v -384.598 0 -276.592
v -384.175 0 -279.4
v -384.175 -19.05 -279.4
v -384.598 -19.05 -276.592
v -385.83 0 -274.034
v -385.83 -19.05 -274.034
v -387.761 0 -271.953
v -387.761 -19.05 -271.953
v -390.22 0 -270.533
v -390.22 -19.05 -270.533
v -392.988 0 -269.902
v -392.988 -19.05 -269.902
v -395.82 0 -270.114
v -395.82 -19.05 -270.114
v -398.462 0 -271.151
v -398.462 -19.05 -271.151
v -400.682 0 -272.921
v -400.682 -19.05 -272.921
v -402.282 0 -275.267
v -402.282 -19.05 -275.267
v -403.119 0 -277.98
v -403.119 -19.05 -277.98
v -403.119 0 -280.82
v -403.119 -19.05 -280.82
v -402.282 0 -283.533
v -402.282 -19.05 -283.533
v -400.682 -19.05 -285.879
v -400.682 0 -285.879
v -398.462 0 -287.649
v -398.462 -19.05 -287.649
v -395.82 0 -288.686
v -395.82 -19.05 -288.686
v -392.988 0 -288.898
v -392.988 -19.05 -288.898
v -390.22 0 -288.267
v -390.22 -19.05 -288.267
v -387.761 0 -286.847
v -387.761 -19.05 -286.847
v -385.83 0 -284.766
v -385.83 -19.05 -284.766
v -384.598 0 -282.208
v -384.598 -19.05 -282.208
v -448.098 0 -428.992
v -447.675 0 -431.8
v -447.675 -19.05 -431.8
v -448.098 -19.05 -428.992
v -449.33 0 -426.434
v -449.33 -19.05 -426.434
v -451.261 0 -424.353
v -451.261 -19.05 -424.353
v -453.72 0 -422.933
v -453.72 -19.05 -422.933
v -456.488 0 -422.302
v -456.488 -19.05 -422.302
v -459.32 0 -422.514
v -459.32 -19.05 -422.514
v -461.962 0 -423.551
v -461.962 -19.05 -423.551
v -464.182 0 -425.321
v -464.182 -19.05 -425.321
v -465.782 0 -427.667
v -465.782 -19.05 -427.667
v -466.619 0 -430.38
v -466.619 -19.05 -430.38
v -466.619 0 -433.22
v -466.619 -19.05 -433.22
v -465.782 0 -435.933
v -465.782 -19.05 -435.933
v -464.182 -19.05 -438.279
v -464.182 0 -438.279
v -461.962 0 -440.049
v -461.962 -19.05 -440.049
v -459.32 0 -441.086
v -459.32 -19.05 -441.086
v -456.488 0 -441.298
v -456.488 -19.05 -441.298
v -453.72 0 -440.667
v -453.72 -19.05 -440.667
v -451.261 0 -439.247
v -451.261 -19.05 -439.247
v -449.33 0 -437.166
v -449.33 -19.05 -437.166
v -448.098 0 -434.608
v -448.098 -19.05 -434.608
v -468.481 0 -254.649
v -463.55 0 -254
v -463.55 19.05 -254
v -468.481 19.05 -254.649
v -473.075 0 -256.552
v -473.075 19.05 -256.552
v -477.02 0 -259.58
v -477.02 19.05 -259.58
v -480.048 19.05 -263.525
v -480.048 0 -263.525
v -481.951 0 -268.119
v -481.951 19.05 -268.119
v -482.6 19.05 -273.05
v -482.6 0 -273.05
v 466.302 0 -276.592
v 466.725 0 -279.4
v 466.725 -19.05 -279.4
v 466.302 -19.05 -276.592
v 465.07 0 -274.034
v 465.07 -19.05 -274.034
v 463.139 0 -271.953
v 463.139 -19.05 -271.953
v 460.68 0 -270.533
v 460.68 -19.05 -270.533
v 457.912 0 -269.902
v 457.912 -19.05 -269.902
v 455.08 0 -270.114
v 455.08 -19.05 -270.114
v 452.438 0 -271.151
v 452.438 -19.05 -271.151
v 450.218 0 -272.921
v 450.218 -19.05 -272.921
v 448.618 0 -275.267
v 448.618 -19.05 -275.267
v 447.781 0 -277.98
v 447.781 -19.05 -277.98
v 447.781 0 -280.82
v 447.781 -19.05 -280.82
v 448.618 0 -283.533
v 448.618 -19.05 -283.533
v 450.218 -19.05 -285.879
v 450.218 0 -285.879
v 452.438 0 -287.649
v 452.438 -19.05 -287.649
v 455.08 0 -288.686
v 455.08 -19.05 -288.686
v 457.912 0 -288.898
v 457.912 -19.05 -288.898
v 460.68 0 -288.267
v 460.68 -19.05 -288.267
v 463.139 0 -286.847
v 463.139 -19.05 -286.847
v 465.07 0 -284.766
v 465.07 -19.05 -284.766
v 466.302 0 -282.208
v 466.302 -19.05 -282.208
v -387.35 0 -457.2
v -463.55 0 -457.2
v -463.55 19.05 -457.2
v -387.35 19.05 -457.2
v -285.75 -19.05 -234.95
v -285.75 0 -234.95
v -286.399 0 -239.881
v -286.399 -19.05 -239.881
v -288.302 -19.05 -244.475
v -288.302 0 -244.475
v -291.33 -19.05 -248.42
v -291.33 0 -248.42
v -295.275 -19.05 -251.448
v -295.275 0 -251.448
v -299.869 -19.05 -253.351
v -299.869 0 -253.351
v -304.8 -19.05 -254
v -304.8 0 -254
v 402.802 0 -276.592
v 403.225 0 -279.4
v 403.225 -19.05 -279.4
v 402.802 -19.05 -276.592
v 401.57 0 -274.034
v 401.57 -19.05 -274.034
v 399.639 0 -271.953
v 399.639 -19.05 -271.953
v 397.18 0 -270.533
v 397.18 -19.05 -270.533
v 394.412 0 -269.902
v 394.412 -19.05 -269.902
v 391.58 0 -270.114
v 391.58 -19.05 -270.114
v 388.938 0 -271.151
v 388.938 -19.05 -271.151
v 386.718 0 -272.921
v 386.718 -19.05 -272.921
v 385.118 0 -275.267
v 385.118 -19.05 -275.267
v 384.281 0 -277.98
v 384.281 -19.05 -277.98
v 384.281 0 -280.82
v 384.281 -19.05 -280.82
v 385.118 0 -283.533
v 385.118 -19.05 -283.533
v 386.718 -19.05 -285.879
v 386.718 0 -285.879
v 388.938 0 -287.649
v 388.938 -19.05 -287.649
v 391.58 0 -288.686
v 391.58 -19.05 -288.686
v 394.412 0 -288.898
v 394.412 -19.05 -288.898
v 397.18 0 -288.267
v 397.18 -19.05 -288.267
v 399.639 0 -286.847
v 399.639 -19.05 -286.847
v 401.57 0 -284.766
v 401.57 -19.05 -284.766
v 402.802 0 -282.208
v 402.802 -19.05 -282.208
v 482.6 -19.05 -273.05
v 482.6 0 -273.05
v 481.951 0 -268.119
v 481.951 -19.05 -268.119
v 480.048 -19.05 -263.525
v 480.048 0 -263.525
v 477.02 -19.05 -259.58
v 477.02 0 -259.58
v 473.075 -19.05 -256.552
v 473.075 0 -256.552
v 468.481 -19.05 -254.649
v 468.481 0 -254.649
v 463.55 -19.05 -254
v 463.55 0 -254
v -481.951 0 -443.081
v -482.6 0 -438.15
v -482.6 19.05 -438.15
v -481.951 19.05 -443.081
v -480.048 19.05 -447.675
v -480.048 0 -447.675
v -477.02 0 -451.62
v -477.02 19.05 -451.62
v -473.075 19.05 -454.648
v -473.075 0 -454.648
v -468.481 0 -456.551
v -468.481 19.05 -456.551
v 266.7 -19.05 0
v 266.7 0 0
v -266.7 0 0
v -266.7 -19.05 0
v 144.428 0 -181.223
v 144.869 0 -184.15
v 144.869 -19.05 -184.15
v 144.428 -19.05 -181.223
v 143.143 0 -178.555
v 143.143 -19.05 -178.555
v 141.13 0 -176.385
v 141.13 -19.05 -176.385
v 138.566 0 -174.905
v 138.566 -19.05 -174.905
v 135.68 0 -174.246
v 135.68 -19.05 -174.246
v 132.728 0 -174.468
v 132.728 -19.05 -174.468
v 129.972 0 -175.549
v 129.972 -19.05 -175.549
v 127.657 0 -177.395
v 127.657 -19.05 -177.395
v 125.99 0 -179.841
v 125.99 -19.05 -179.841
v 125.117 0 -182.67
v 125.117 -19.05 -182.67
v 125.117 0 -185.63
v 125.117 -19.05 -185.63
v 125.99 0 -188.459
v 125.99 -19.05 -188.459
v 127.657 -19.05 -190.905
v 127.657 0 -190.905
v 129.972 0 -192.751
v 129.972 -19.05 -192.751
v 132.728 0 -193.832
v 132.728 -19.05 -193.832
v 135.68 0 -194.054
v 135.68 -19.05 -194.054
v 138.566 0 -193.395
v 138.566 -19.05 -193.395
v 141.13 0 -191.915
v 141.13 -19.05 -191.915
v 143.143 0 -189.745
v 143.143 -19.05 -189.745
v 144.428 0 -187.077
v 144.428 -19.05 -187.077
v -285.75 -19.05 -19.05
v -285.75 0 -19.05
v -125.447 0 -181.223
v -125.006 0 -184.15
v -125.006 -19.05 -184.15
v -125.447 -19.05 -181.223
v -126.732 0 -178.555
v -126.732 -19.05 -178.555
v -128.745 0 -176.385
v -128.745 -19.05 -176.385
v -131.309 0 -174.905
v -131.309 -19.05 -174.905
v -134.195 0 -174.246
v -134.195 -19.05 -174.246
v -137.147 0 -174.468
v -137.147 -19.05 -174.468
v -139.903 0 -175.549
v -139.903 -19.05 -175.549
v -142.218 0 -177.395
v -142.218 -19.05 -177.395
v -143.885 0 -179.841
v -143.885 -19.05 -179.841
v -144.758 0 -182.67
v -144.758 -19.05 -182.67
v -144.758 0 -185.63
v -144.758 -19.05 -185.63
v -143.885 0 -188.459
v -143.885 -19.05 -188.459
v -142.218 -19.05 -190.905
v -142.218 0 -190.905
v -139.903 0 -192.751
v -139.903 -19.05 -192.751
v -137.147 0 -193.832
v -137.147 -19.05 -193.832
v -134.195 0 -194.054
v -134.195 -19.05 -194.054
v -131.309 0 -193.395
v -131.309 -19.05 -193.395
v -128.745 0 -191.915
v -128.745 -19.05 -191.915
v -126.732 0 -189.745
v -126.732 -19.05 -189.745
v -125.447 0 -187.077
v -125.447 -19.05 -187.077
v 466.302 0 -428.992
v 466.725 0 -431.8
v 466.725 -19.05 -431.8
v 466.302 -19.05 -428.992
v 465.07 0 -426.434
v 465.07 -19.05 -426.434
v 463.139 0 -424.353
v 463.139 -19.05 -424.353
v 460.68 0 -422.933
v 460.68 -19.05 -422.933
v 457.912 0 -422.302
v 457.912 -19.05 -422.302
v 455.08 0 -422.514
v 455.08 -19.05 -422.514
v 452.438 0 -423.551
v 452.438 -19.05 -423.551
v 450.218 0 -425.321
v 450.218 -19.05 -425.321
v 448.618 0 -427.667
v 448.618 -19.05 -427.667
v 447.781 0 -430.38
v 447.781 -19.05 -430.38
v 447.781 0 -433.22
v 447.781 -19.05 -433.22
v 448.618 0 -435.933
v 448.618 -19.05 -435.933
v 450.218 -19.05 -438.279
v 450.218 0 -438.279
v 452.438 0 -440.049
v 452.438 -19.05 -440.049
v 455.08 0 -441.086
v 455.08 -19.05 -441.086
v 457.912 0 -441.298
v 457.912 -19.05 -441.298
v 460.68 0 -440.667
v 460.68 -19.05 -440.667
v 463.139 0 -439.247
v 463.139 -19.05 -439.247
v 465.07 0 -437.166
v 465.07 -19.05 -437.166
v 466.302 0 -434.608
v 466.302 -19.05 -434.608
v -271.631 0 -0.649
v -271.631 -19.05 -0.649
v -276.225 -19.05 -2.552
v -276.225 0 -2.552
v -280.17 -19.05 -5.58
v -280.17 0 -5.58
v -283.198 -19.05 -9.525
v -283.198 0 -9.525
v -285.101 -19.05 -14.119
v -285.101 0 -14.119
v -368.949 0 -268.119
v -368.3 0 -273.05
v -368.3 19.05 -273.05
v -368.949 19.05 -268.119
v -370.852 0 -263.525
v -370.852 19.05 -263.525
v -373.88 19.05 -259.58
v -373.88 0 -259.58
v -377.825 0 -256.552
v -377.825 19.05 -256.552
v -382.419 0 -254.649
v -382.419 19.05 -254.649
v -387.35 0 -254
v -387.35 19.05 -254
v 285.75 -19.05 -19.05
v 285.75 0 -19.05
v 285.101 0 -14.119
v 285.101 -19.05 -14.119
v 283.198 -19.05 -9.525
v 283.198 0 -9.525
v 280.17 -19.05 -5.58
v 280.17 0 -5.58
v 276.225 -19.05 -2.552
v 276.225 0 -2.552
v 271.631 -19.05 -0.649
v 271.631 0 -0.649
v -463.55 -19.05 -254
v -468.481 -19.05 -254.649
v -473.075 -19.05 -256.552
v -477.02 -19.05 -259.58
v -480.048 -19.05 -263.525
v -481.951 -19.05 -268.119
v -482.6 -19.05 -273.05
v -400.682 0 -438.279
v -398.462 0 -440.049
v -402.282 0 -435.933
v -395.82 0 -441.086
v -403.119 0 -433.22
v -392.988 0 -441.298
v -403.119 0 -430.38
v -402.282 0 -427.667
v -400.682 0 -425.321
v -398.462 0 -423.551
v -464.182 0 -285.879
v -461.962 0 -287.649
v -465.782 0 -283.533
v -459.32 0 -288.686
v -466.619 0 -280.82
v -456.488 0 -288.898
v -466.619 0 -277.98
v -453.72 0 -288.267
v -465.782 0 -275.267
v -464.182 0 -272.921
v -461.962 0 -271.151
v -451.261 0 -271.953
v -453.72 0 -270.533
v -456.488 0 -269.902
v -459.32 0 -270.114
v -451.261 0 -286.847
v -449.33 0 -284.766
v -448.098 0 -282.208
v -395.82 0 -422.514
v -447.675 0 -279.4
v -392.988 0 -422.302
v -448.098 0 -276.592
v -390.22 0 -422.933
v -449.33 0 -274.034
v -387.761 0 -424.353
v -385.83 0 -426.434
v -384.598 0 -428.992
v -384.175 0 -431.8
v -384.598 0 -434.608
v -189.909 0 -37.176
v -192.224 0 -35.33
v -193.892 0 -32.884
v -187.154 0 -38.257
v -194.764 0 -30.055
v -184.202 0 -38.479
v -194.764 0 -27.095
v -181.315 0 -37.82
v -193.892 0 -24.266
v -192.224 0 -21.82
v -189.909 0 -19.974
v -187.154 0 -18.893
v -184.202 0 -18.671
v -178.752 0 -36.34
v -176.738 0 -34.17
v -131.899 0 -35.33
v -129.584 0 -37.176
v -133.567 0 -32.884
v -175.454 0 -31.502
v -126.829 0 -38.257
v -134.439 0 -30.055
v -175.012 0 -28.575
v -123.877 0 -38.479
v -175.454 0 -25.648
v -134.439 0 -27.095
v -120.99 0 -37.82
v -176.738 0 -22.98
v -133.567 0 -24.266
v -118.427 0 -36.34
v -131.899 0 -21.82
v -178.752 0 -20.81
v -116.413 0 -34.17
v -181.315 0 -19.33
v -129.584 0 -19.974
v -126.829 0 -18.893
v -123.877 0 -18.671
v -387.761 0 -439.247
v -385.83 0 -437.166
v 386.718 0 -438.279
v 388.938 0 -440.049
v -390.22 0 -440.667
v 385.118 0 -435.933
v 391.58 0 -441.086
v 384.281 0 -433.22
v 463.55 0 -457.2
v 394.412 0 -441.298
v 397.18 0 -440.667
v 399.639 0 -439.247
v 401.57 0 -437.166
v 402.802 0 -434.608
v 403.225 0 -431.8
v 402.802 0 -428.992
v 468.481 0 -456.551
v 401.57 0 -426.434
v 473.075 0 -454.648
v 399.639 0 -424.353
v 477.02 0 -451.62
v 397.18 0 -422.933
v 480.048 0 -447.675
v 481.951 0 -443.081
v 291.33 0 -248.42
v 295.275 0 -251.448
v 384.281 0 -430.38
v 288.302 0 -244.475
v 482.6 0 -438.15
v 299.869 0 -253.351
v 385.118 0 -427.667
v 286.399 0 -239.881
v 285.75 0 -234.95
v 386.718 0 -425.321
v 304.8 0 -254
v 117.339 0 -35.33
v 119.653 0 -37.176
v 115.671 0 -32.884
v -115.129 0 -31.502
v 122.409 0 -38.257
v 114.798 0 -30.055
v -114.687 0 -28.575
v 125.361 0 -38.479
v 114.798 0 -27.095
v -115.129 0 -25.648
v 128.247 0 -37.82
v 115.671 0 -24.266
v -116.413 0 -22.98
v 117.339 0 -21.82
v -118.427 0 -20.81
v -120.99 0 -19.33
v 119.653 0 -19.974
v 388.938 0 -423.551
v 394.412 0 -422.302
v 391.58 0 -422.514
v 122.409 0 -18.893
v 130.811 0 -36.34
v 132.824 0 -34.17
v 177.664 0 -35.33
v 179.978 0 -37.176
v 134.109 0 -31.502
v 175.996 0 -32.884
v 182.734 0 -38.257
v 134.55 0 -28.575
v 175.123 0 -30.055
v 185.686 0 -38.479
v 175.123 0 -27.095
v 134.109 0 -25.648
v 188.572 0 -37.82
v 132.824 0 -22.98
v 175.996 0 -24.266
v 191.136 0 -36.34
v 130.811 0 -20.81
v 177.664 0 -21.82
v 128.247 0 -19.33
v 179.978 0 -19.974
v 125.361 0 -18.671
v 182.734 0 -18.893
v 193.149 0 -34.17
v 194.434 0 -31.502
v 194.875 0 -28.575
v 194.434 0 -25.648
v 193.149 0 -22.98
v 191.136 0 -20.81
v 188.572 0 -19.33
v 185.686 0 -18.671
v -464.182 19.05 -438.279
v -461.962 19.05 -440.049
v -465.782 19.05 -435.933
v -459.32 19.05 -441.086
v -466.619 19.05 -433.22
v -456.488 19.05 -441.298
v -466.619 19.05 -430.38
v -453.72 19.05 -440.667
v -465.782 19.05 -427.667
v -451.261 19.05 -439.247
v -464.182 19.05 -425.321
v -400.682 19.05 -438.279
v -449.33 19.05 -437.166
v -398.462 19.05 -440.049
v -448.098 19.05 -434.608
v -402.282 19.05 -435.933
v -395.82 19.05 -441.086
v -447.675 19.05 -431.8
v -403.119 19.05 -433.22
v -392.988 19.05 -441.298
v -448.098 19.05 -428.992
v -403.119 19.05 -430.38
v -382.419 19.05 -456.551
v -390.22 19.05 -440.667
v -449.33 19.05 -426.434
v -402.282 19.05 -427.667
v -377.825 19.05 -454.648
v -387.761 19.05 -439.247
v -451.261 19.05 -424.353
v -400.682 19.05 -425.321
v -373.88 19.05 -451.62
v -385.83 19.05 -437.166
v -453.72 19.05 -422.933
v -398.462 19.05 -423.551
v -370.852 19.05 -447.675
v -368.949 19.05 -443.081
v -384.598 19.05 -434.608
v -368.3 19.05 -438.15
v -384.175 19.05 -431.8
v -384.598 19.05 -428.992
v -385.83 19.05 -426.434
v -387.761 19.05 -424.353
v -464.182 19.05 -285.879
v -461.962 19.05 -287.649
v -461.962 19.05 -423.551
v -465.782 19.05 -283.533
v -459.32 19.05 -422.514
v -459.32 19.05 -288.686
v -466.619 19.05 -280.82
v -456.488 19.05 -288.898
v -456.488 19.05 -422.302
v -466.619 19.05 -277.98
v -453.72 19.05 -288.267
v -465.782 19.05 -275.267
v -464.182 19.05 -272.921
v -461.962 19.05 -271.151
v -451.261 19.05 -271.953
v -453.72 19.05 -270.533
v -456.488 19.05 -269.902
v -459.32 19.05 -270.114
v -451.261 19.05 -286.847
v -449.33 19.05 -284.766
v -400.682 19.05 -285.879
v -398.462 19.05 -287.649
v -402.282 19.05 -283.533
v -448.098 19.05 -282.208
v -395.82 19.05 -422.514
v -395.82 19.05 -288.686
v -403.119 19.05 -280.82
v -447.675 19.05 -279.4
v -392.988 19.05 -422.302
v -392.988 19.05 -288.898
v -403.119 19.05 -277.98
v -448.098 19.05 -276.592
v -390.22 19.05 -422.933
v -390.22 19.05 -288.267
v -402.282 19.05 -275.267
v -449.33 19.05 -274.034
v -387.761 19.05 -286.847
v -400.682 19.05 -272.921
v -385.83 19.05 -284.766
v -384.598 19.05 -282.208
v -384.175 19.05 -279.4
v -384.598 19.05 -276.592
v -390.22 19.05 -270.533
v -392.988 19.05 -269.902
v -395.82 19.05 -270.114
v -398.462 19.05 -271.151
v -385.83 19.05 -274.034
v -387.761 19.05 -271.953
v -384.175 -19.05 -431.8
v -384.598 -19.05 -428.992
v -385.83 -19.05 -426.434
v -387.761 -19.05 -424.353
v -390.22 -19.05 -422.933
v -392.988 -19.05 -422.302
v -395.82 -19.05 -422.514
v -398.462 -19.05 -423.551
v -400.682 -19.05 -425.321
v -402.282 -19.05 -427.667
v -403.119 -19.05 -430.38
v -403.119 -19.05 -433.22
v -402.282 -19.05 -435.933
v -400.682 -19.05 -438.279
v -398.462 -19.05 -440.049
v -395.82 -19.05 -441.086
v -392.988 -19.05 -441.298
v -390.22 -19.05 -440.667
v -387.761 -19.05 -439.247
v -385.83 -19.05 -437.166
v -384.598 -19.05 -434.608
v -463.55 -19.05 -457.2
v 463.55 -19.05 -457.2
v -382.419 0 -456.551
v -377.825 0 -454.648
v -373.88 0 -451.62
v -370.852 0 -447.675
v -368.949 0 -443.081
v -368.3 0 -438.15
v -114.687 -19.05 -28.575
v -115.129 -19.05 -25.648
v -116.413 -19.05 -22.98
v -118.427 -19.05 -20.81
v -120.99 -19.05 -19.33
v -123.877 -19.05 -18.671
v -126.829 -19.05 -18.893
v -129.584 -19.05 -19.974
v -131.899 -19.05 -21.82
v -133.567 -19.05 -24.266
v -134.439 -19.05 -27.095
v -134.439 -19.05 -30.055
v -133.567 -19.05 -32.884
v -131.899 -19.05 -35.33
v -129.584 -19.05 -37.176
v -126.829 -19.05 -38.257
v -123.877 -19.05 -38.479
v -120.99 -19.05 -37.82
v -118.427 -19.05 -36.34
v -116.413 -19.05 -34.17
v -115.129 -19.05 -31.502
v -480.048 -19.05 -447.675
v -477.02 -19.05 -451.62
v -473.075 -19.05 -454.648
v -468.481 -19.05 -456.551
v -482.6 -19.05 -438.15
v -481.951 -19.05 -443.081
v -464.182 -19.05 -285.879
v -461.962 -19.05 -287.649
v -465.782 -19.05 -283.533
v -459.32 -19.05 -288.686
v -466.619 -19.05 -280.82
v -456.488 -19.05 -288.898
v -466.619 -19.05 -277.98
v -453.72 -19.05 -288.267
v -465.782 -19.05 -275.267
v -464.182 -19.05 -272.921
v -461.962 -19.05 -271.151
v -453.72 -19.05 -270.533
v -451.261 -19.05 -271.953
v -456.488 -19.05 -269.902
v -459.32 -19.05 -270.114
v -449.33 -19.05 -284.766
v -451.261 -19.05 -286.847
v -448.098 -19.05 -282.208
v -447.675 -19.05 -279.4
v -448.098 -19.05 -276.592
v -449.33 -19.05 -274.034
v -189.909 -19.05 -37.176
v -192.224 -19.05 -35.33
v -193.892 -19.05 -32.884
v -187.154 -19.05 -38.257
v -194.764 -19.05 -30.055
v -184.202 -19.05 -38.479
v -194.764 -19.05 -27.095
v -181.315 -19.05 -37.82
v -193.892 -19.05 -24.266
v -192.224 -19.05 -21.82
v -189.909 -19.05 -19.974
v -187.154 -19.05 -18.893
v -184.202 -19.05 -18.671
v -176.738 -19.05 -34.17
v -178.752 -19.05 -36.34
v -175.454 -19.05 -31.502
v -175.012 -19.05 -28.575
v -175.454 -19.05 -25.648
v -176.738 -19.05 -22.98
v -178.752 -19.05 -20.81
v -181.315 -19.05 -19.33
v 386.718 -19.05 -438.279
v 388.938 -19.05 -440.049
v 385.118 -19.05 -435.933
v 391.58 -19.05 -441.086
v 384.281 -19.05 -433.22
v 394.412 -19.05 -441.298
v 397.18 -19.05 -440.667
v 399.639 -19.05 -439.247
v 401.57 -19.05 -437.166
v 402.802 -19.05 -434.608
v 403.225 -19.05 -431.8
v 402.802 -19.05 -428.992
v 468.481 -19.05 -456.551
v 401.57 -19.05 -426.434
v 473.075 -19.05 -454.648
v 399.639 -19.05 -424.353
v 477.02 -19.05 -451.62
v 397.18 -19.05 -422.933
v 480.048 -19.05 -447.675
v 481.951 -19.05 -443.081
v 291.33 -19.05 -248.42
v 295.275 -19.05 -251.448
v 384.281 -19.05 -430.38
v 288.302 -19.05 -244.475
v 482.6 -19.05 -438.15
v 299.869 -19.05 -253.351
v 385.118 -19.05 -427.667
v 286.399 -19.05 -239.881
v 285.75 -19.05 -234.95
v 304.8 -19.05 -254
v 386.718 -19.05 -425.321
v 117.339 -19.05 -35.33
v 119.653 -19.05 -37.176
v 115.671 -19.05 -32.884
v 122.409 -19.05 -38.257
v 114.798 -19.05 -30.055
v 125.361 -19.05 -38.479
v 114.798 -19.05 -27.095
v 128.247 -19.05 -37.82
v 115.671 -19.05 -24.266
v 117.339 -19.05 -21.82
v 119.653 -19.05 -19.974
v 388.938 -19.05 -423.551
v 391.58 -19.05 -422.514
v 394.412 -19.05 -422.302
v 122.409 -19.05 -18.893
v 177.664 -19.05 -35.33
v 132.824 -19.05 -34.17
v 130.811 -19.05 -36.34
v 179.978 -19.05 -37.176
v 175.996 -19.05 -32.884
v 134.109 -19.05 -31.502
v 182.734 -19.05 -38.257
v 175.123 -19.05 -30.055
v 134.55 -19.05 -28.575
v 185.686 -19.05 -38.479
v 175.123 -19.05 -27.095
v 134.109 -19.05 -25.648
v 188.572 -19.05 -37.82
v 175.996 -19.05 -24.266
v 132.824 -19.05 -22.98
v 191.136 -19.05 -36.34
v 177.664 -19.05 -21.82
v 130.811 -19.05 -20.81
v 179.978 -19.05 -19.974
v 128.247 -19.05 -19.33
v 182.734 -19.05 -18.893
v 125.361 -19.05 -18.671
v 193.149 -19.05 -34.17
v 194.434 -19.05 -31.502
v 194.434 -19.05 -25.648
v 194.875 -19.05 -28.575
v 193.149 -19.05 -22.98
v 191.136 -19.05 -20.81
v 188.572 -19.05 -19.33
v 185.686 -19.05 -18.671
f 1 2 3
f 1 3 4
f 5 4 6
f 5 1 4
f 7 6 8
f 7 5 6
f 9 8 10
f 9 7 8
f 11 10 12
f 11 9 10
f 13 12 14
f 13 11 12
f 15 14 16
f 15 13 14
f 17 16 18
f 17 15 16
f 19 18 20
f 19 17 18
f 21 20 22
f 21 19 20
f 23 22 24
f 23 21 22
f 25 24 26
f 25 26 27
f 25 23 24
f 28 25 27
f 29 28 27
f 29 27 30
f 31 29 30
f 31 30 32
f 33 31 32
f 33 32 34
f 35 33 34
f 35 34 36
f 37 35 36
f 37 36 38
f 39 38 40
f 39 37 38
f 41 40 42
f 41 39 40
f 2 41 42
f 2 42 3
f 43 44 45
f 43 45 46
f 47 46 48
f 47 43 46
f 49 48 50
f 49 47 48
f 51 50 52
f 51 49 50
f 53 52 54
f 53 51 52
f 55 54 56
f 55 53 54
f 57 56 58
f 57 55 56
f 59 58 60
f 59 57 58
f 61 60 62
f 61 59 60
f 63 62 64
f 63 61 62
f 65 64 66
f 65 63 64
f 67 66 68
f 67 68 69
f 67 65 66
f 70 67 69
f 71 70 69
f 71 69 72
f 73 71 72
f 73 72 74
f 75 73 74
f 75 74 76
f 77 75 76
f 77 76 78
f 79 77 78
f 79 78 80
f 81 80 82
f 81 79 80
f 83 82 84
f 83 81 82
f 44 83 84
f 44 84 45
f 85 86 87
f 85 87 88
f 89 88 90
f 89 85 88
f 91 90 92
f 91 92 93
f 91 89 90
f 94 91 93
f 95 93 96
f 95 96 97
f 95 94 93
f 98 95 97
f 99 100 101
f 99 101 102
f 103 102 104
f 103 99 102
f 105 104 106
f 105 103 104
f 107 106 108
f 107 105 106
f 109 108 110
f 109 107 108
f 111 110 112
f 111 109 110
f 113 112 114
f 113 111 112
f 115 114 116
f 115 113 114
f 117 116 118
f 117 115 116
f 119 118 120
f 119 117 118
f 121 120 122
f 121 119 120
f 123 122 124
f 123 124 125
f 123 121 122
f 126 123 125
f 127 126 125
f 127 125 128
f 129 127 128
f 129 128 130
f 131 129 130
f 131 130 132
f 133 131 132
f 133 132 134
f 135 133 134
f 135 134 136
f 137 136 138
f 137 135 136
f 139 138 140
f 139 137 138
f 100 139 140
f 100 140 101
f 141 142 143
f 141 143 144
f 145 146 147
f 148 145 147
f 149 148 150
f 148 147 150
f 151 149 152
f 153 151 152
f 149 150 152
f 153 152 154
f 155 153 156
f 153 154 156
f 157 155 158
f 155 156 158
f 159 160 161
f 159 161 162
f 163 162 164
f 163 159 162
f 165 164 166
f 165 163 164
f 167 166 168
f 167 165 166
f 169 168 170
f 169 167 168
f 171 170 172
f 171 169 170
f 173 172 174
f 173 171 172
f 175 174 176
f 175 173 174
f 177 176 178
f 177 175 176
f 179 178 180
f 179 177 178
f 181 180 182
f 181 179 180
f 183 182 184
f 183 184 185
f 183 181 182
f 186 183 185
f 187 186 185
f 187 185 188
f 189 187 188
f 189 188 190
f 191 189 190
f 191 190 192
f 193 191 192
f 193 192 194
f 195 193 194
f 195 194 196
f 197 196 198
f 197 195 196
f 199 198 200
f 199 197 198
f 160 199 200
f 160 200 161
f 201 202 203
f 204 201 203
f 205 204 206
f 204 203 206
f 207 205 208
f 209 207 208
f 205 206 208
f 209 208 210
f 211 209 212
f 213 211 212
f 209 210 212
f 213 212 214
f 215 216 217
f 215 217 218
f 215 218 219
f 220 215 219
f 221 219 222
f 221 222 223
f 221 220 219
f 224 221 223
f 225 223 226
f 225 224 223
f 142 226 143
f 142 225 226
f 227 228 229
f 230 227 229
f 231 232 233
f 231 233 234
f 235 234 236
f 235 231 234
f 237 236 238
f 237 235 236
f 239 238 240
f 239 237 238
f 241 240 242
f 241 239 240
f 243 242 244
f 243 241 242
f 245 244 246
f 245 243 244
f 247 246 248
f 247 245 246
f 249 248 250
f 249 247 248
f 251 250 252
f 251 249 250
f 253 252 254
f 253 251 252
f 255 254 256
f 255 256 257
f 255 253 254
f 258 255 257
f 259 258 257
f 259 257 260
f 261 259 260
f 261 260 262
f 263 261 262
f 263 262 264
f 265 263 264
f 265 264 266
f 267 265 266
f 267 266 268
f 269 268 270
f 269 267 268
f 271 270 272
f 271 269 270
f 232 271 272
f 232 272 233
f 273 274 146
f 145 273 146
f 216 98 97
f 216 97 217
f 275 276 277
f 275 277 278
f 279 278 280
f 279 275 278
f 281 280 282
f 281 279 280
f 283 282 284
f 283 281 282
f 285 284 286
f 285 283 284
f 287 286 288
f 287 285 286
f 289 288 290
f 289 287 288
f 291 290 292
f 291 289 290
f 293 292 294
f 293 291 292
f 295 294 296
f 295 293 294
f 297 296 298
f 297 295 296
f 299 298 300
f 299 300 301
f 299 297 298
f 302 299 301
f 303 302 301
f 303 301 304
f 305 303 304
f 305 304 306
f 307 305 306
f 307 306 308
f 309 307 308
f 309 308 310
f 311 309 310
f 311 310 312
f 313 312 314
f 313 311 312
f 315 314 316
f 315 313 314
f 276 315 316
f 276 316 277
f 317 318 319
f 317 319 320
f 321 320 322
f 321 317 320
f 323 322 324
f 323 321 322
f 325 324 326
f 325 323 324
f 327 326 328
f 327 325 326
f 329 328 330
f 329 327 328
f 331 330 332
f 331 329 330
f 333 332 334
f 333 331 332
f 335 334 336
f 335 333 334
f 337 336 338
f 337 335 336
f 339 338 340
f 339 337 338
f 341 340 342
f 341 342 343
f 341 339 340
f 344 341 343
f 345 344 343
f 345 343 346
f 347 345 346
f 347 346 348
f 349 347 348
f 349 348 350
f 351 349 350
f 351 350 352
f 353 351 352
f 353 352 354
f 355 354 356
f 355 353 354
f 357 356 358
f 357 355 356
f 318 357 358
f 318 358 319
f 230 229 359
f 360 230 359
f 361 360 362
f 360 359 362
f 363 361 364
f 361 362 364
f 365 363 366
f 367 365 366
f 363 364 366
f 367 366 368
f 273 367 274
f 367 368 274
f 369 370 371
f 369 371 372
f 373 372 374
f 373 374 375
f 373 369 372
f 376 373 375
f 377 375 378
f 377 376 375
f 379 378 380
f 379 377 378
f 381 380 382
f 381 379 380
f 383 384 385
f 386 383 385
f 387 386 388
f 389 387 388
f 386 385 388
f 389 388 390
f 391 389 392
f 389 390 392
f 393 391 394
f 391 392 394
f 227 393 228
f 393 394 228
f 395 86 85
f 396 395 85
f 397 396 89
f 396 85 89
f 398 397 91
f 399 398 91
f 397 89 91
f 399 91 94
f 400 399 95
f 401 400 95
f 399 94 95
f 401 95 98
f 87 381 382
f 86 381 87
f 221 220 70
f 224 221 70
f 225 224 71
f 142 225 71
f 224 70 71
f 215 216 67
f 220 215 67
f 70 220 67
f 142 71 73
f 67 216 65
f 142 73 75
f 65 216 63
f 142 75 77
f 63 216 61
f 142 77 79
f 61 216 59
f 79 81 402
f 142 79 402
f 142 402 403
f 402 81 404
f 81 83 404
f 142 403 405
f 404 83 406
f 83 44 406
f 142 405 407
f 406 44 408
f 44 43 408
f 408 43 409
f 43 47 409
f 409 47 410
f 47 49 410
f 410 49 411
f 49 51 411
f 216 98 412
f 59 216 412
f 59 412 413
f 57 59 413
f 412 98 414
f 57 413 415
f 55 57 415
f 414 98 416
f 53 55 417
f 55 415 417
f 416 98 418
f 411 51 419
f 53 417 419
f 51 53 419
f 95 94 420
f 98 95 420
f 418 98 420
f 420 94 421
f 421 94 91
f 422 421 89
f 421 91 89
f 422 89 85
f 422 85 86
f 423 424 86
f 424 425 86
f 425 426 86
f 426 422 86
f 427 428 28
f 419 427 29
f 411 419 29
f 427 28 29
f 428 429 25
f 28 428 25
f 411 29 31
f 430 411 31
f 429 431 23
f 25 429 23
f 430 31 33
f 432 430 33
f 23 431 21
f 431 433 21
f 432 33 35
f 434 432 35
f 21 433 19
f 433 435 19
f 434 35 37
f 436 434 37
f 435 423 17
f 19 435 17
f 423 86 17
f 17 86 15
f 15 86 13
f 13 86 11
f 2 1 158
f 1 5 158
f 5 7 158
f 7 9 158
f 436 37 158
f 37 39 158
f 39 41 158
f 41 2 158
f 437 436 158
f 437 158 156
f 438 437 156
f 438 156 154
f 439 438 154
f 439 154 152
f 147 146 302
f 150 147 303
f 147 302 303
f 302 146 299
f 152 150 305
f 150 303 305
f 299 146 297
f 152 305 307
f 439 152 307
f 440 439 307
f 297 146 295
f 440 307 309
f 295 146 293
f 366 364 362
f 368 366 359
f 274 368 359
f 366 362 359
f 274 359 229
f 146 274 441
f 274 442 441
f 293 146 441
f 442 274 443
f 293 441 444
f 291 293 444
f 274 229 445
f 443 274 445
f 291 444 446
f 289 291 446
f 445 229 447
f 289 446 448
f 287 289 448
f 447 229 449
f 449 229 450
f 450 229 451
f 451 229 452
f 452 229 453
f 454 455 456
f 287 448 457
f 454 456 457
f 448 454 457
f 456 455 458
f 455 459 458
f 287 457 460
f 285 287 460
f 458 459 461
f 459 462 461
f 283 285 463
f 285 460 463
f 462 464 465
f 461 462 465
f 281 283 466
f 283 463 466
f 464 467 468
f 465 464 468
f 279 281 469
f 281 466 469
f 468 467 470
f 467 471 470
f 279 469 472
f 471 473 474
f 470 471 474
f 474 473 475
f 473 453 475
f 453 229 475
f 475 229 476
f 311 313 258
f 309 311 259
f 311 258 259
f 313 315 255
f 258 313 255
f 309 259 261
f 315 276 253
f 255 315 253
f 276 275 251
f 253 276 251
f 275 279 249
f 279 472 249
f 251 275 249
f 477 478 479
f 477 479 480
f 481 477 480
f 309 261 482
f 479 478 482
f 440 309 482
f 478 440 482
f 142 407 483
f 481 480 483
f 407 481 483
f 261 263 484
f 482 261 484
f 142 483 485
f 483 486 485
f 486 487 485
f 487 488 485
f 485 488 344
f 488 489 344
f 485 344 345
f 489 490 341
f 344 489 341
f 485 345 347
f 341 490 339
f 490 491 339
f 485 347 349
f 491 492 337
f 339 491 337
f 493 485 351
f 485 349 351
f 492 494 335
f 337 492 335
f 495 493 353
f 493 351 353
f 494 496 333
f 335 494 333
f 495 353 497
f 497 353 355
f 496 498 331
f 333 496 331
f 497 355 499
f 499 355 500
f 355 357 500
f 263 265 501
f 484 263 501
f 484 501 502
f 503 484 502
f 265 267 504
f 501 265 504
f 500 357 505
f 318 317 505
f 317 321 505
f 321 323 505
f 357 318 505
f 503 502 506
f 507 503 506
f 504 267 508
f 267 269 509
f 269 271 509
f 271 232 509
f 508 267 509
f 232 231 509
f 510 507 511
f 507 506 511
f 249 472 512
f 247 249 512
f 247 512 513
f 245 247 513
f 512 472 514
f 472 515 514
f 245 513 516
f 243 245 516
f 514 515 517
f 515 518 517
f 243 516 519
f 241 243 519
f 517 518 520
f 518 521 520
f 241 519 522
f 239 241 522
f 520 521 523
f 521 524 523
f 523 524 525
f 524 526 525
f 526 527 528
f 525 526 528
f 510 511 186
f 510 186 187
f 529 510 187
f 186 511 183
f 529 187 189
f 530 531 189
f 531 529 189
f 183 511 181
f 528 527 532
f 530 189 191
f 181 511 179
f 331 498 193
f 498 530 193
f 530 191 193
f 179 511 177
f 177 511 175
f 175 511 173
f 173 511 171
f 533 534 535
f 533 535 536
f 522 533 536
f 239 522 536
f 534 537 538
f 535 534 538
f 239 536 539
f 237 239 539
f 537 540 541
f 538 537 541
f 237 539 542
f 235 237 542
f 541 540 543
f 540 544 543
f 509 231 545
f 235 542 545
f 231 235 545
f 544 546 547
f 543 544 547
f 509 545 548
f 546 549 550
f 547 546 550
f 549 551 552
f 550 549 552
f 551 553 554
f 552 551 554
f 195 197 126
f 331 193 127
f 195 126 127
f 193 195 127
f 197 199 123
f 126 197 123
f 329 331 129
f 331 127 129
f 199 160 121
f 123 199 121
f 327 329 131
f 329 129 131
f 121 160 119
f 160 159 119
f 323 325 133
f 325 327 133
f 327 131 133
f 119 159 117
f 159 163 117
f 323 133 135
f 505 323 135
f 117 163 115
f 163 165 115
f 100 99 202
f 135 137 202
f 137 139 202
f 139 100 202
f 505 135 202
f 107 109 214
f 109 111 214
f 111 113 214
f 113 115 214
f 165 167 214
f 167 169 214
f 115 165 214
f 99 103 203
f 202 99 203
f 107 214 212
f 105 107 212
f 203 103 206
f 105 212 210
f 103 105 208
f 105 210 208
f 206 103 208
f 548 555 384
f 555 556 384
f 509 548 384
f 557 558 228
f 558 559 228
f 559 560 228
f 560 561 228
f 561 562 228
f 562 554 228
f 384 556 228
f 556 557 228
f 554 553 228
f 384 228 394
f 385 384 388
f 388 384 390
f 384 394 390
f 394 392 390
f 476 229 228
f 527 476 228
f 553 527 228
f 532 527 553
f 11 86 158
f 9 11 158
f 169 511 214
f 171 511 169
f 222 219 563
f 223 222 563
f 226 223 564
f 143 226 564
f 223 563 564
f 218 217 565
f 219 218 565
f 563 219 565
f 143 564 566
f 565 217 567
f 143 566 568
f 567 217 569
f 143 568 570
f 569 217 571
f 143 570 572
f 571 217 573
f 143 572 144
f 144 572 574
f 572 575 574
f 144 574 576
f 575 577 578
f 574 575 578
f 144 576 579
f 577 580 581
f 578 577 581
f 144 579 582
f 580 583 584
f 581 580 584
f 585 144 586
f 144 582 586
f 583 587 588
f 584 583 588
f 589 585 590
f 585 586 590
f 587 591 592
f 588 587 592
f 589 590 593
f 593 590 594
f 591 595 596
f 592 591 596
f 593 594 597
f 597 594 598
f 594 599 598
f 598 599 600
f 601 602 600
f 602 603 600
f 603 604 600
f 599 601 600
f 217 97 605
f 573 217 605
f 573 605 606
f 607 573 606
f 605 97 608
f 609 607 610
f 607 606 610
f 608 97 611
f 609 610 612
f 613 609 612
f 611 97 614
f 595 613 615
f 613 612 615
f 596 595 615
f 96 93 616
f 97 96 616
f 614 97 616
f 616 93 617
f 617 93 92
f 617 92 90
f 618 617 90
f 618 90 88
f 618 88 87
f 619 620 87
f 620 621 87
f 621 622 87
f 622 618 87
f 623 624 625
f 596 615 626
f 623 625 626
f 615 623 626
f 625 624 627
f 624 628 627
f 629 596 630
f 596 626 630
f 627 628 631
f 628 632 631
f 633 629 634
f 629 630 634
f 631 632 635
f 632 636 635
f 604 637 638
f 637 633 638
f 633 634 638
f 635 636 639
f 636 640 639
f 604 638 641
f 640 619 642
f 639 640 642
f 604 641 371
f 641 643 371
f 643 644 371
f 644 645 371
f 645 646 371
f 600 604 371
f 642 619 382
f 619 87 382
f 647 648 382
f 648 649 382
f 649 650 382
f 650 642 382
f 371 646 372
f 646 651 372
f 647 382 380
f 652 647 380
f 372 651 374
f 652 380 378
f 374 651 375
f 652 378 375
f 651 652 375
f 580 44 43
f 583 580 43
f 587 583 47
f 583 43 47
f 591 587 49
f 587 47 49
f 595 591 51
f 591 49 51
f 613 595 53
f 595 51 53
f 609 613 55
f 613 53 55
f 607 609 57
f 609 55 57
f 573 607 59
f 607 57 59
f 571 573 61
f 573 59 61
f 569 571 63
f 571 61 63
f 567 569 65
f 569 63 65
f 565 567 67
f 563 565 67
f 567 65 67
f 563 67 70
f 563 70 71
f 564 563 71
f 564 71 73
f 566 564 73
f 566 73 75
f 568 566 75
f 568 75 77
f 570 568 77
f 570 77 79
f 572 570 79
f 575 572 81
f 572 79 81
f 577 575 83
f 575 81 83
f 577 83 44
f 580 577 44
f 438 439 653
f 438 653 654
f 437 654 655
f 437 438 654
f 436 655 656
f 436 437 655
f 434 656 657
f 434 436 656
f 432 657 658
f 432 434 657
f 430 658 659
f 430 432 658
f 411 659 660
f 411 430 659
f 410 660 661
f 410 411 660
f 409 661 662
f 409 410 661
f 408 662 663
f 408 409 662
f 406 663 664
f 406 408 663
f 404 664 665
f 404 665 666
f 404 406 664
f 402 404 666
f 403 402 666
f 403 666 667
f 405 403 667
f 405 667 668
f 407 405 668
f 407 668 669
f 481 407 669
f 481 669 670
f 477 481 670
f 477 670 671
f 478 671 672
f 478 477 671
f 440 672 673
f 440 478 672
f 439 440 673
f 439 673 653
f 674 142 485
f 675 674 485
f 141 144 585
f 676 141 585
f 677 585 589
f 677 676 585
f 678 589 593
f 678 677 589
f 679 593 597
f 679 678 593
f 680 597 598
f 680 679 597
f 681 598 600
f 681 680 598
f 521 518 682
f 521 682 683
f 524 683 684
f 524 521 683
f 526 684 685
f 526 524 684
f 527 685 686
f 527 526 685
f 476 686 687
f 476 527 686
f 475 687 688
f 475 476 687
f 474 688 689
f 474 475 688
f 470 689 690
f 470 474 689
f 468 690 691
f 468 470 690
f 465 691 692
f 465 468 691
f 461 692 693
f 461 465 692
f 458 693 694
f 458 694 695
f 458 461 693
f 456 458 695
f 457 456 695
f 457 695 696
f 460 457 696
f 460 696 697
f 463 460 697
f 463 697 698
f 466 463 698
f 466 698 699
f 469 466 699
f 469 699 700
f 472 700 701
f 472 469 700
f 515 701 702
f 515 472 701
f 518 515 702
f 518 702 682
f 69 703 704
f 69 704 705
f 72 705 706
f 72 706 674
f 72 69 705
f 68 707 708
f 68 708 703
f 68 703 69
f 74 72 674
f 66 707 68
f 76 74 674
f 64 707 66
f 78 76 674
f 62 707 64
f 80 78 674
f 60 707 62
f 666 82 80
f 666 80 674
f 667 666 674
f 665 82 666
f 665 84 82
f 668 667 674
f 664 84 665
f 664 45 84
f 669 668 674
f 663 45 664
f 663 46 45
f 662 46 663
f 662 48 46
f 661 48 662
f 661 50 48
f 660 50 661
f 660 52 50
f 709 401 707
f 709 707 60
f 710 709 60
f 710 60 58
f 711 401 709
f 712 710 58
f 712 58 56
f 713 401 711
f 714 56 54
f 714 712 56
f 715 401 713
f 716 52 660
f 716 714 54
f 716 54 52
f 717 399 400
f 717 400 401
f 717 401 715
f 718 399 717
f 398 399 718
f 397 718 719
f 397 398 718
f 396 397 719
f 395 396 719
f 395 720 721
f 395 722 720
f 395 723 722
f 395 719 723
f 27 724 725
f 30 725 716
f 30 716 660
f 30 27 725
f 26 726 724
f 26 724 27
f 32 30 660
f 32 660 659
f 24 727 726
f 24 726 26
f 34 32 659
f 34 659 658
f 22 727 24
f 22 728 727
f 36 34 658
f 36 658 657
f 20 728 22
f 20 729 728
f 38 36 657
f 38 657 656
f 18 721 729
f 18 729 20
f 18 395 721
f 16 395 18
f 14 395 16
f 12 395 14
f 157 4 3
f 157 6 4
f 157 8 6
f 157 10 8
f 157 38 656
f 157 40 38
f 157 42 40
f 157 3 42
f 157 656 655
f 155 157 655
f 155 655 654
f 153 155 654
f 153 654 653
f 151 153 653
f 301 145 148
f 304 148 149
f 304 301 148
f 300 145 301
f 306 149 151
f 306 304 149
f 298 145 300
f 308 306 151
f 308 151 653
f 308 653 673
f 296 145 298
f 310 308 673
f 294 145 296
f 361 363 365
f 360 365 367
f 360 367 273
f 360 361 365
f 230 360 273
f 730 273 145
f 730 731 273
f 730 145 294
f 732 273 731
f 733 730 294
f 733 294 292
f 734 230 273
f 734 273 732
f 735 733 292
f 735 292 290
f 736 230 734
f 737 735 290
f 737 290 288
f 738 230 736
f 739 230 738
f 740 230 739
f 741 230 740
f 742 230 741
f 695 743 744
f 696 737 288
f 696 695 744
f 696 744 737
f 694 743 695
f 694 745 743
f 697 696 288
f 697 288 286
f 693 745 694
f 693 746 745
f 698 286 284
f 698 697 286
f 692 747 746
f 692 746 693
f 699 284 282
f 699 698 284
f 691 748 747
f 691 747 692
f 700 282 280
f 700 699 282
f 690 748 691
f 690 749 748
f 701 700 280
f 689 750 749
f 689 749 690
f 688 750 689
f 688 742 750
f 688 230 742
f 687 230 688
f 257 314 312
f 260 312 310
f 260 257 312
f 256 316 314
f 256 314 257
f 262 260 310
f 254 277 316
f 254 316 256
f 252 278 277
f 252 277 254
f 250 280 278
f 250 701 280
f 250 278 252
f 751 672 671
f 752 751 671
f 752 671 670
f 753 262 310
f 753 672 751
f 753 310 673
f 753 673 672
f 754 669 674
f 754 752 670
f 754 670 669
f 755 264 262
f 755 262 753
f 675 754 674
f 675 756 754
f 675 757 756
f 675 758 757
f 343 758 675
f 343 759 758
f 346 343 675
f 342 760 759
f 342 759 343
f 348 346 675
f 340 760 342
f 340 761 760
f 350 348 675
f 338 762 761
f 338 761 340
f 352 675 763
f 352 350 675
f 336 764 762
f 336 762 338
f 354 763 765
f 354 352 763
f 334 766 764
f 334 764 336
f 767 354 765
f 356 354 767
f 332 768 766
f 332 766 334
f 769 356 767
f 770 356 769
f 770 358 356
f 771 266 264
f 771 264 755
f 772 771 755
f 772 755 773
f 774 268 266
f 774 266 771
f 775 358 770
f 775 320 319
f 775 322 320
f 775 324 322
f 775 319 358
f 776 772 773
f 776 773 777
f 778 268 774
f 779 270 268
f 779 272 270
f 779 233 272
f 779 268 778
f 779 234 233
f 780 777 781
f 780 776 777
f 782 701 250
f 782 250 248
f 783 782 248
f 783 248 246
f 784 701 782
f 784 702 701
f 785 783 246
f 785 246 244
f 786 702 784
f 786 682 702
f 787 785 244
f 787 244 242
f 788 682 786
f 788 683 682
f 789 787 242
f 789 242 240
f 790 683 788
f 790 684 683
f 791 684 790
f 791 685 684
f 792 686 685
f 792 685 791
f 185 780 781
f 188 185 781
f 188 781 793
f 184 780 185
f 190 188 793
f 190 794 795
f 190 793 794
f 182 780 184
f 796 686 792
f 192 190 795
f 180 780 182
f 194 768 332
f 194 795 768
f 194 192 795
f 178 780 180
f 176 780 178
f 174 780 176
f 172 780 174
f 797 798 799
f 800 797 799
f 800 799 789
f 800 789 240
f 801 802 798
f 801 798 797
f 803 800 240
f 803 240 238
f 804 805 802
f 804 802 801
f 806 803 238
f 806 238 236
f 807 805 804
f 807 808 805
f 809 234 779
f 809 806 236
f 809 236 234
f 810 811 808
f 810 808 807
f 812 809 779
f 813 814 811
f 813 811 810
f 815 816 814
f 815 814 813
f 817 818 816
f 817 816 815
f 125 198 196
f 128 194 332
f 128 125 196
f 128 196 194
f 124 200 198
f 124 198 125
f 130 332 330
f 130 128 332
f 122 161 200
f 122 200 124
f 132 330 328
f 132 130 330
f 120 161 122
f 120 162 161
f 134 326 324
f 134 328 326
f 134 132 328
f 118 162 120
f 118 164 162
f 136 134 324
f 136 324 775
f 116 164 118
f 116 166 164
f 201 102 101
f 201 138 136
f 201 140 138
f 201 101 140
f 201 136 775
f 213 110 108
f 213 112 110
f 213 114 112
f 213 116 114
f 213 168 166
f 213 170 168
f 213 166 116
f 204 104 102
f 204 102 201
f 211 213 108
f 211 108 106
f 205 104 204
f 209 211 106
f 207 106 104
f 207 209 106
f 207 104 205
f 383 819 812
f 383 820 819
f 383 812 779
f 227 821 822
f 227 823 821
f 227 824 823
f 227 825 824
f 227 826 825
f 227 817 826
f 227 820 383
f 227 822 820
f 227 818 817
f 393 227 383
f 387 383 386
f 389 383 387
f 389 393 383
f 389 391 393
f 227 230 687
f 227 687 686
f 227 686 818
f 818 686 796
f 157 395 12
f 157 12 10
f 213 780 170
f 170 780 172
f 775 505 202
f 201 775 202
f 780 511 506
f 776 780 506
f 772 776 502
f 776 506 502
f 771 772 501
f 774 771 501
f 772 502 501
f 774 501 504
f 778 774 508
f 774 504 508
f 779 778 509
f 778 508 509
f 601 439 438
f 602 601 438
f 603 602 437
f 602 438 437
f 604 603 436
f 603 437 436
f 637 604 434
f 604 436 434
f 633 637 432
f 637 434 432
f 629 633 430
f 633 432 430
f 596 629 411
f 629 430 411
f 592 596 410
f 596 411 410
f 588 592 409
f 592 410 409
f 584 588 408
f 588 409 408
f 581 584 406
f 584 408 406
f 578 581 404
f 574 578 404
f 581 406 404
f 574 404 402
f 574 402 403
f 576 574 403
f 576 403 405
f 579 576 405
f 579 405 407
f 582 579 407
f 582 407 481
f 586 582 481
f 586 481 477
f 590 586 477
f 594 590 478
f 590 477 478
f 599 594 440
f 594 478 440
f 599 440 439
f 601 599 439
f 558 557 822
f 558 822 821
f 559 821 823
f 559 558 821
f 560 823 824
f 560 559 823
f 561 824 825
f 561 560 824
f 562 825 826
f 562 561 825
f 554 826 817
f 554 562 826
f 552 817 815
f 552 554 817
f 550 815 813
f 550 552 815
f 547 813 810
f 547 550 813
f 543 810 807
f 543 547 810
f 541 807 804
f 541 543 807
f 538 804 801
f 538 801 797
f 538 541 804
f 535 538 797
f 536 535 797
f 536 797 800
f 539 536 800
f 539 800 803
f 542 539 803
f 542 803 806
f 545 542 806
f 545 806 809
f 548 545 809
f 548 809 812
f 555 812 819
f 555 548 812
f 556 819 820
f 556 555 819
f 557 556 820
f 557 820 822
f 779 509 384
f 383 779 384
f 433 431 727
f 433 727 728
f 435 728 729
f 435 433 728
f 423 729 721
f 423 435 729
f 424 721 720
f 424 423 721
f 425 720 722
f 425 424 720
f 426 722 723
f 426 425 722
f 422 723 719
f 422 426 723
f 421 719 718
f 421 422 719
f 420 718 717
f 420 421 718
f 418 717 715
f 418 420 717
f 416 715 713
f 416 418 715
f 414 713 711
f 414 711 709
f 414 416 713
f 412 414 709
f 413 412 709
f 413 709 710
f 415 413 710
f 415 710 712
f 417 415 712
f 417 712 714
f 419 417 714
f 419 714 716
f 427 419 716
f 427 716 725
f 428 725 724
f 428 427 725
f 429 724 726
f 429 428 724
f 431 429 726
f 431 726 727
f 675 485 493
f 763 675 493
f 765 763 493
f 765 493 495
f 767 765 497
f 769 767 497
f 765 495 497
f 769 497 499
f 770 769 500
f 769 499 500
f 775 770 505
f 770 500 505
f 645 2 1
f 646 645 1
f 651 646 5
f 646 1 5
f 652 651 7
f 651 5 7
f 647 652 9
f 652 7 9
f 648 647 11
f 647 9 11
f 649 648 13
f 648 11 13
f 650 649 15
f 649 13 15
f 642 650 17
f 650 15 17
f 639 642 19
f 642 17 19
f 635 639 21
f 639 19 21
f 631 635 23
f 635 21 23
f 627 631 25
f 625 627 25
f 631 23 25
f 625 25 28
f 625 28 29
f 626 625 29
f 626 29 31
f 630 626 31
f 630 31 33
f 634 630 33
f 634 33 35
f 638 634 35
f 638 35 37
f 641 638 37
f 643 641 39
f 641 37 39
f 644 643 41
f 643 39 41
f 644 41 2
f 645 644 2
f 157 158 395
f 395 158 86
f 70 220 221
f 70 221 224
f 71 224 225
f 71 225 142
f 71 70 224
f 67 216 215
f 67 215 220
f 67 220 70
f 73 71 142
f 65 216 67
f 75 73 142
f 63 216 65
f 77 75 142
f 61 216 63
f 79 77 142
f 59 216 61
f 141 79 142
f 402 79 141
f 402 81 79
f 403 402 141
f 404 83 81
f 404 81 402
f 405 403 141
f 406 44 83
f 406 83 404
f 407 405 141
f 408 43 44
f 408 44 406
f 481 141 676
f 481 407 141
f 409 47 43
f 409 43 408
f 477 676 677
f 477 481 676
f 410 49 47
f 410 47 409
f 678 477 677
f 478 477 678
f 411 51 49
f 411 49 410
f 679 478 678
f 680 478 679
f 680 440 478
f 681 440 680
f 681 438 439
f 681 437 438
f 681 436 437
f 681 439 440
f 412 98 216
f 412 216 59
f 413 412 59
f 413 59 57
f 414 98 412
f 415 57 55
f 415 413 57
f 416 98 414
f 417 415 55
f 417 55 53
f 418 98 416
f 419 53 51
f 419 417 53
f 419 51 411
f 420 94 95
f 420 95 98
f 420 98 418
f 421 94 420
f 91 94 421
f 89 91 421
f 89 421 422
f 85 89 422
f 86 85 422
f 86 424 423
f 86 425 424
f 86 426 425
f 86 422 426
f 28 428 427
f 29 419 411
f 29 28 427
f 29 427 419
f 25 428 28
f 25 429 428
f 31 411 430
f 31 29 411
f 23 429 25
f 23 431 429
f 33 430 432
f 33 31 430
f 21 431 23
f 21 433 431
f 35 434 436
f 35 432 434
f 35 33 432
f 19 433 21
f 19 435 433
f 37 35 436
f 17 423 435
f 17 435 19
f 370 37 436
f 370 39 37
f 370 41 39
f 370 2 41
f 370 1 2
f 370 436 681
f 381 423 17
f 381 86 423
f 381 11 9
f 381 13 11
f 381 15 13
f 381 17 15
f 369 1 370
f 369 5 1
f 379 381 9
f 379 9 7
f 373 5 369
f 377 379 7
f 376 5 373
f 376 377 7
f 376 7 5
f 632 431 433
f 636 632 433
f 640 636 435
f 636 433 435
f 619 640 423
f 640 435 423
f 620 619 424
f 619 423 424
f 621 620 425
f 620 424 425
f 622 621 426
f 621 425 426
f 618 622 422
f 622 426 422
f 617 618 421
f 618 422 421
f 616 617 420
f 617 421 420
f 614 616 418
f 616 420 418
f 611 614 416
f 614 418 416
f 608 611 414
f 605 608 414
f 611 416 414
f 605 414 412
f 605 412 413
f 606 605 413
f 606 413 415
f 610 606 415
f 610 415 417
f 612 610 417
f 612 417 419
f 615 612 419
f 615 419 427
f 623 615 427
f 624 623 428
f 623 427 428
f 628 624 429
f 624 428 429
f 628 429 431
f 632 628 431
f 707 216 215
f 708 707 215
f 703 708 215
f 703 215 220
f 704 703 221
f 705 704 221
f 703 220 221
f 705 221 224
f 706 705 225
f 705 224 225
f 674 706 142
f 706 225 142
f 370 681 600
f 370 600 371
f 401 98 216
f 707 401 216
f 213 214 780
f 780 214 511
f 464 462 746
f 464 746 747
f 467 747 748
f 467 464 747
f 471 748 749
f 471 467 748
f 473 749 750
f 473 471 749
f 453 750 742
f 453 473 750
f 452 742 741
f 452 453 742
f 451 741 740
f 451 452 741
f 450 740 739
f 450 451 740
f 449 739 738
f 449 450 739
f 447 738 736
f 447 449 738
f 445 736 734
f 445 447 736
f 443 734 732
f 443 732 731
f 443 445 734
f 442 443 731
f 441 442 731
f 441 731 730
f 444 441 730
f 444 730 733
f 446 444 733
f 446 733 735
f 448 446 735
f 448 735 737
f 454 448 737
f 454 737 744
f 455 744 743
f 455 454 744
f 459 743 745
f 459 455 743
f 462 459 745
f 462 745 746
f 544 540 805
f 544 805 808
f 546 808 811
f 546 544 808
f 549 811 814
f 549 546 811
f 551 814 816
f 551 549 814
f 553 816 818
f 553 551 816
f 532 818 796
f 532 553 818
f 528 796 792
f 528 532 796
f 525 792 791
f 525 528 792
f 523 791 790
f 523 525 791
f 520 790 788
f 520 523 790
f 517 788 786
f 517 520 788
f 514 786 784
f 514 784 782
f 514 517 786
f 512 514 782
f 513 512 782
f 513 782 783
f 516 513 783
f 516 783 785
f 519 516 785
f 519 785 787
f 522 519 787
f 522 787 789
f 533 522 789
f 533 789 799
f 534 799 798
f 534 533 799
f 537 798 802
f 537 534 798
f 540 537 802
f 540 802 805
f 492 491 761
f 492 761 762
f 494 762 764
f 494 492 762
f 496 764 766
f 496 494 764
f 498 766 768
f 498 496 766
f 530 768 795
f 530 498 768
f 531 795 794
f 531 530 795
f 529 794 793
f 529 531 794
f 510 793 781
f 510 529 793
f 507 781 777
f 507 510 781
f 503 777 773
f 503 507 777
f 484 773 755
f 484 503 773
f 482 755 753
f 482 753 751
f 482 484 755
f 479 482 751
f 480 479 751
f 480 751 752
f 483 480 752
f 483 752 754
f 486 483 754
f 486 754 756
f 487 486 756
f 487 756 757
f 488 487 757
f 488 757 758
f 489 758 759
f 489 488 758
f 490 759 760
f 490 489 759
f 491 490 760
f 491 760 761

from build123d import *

# Parameters (mm, degrees)
F0_R     = 9.9314
F0_R_2   = 9.525
F1_DEPTH = 19.05
F2_R     = 9.525
F3_DEPTH = 19.05


with BuildPart() as f1:
    # F0 (on Front) → F1 (new body)
    with BuildSketch(Plane.XZ):
        with BuildLine():
            Line((266.7, 0), (0, 0))
            Line((0, 0), (0, -254))
            Line((0, -254), (304.8, -254))
            ThreePointArc((304.8, -254), (291.329616, -248.420384), (285.75, -234.95))
            Line((285.75, -234.95), (285.75, -19.05))
            ThreePointArc((285.75, -19.05), (280.170384, -5.579616), (266.7, 0))
        make_face()
        with Locations((134.9375, -184.15)):
            Circle(F0_R, mode=Mode.SUBTRACT)
        with Locations((124.61875, -28.575)):
            Circle(F0_R, mode=Mode.SUBTRACT)
        with Locations((184.94375, -28.575)):
            Circle(F0_R, mode=Mode.SUBTRACT)
        with BuildLine():
            ThreePointArc((-266.7, 0), (-280.170384, -5.579616), (-285.75, -19.05))
            Line((-285.75, -19.05), (-285.75, -234.95))
            ThreePointArc((-285.75, -234.95), (-291.329616, -248.420384), (-304.8, -254))
            Line((-304.8, -254), (0, -254))
            Line((0, -254), (0, 0))
            Line((0, 0), (-266.7, 0))
        make_face()
        with Locations((-134.9375, -184.15)):
            Circle(F0_R, mode=Mode.SUBTRACT)
        with Locations((-184.94375, -28.575)):
            Circle(F0_R, mode=Mode.SUBTRACT)
        with Locations((-124.61875, -28.575)):
            Circle(F0_R, mode=Mode.SUBTRACT)
        with BuildLine():
            Line((0, -254), (-304.8, -254))
            Line((-304.8, -254), (-463.55, -254))
            ThreePointArc((-463.55, -254), (-477.020384, -259.579616), (-482.6, -273.05))
            Line((-482.6, -273.05), (-482.6, -438.15))
            ThreePointArc((-482.6, -438.15), (-477.020384, -451.620384), (-463.55, -457.2))
            Line((-463.55, -457.2), (0, -457.2))
            Line((0, -457.2), (0, -254))
        make_face()
        with Locations((-457.2, -431.8)):
            Circle(F0_R_2, mode=Mode.SUBTRACT)
        with Locations((-393.7, -431.8)):
            Circle(F0_R_2, mode=Mode.SUBTRACT)
        with Locations((-457.2, -279.4)):
            Circle(F0_R_2, mode=Mode.SUBTRACT)
        with Locations((-393.7, -279.4)):
            Circle(F0_R_2, mode=Mode.SUBTRACT)
        with BuildLine():
            Line((304.8, -254), (0, -254))
            Line((0, -254), (0, -457.2))
            Line((0, -457.2), (463.55, -457.2))
            ThreePointArc((463.55, -457.2), (477.020384, -451.620384), (482.6, -438.15))
            Line((482.6, -438.15), (482.6, -273.05))
            ThreePointArc((482.6, -273.05), (477.020384, -259.579616), (463.55, -254))
            Line((463.55, -254), (304.8, -254))
        make_face()
        with Locations((393.7, -431.8)):
            Circle(F0_R_2, mode=Mode.SUBTRACT)
        with Locations((457.2, -431.8)):
            Circle(F0_R_2, mode=Mode.SUBTRACT)
        with Locations((393.7, -279.4)):
            Circle(F0_R_2, mode=Mode.SUBTRACT)
        with Locations((457.2, -279.4)):
            Circle(F0_R_2, mode=Mode.SUBTRACT)
    extrude(amount=F1_DEPTH)


with BuildPart() as f3:
    # F2 (on Front) → F3 (new body)
    with BuildSketch(Plane.XZ):
        with BuildLine():
            Line((-387.35, -254), (-425.45, -254))
            Line((-425.45, -254), (-463.55, -254))
            ThreePointArc((-463.55, -254), (-477.020384, -259.579616), (-482.6, -273.05))
            Line((-482.6, -273.05), (-482.6, -438.15))
            ThreePointArc((-482.6, -438.15), (-477.020384, -451.620384), (-463.55, -457.2))
            Line((-463.55, -457.2), (-425.45, -457.2))
            Line((-425.45, -457.2), (-387.35, -457.2))
            ThreePointArc((-387.35, -457.2), (-373.879616, -451.620384), (-368.3, -438.15))
            Line((-368.3, -438.15), (-368.3, -273.05))
            ThreePointArc((-368.3, -273.05), (-373.879616, -259.579616), (-387.35, -254))
        make_face()
        with Locations((-457.2, -431.8)):
            Circle(F2_R, mode=Mode.SUBTRACT)
        with Locations((-393.7, -431.8)):
            Circle(F2_R, mode=Mode.SUBTRACT)
        with Locations((-457.2, -279.4)):
            Circle(F2_R, mode=Mode.SUBTRACT)
        with Locations((-393.7, -279.4)):
            Circle(F2_R, mode=Mode.SUBTRACT)
    extrude(amount=-F3_DEPTH)


solid = Compound([f1.part, f3.part])
